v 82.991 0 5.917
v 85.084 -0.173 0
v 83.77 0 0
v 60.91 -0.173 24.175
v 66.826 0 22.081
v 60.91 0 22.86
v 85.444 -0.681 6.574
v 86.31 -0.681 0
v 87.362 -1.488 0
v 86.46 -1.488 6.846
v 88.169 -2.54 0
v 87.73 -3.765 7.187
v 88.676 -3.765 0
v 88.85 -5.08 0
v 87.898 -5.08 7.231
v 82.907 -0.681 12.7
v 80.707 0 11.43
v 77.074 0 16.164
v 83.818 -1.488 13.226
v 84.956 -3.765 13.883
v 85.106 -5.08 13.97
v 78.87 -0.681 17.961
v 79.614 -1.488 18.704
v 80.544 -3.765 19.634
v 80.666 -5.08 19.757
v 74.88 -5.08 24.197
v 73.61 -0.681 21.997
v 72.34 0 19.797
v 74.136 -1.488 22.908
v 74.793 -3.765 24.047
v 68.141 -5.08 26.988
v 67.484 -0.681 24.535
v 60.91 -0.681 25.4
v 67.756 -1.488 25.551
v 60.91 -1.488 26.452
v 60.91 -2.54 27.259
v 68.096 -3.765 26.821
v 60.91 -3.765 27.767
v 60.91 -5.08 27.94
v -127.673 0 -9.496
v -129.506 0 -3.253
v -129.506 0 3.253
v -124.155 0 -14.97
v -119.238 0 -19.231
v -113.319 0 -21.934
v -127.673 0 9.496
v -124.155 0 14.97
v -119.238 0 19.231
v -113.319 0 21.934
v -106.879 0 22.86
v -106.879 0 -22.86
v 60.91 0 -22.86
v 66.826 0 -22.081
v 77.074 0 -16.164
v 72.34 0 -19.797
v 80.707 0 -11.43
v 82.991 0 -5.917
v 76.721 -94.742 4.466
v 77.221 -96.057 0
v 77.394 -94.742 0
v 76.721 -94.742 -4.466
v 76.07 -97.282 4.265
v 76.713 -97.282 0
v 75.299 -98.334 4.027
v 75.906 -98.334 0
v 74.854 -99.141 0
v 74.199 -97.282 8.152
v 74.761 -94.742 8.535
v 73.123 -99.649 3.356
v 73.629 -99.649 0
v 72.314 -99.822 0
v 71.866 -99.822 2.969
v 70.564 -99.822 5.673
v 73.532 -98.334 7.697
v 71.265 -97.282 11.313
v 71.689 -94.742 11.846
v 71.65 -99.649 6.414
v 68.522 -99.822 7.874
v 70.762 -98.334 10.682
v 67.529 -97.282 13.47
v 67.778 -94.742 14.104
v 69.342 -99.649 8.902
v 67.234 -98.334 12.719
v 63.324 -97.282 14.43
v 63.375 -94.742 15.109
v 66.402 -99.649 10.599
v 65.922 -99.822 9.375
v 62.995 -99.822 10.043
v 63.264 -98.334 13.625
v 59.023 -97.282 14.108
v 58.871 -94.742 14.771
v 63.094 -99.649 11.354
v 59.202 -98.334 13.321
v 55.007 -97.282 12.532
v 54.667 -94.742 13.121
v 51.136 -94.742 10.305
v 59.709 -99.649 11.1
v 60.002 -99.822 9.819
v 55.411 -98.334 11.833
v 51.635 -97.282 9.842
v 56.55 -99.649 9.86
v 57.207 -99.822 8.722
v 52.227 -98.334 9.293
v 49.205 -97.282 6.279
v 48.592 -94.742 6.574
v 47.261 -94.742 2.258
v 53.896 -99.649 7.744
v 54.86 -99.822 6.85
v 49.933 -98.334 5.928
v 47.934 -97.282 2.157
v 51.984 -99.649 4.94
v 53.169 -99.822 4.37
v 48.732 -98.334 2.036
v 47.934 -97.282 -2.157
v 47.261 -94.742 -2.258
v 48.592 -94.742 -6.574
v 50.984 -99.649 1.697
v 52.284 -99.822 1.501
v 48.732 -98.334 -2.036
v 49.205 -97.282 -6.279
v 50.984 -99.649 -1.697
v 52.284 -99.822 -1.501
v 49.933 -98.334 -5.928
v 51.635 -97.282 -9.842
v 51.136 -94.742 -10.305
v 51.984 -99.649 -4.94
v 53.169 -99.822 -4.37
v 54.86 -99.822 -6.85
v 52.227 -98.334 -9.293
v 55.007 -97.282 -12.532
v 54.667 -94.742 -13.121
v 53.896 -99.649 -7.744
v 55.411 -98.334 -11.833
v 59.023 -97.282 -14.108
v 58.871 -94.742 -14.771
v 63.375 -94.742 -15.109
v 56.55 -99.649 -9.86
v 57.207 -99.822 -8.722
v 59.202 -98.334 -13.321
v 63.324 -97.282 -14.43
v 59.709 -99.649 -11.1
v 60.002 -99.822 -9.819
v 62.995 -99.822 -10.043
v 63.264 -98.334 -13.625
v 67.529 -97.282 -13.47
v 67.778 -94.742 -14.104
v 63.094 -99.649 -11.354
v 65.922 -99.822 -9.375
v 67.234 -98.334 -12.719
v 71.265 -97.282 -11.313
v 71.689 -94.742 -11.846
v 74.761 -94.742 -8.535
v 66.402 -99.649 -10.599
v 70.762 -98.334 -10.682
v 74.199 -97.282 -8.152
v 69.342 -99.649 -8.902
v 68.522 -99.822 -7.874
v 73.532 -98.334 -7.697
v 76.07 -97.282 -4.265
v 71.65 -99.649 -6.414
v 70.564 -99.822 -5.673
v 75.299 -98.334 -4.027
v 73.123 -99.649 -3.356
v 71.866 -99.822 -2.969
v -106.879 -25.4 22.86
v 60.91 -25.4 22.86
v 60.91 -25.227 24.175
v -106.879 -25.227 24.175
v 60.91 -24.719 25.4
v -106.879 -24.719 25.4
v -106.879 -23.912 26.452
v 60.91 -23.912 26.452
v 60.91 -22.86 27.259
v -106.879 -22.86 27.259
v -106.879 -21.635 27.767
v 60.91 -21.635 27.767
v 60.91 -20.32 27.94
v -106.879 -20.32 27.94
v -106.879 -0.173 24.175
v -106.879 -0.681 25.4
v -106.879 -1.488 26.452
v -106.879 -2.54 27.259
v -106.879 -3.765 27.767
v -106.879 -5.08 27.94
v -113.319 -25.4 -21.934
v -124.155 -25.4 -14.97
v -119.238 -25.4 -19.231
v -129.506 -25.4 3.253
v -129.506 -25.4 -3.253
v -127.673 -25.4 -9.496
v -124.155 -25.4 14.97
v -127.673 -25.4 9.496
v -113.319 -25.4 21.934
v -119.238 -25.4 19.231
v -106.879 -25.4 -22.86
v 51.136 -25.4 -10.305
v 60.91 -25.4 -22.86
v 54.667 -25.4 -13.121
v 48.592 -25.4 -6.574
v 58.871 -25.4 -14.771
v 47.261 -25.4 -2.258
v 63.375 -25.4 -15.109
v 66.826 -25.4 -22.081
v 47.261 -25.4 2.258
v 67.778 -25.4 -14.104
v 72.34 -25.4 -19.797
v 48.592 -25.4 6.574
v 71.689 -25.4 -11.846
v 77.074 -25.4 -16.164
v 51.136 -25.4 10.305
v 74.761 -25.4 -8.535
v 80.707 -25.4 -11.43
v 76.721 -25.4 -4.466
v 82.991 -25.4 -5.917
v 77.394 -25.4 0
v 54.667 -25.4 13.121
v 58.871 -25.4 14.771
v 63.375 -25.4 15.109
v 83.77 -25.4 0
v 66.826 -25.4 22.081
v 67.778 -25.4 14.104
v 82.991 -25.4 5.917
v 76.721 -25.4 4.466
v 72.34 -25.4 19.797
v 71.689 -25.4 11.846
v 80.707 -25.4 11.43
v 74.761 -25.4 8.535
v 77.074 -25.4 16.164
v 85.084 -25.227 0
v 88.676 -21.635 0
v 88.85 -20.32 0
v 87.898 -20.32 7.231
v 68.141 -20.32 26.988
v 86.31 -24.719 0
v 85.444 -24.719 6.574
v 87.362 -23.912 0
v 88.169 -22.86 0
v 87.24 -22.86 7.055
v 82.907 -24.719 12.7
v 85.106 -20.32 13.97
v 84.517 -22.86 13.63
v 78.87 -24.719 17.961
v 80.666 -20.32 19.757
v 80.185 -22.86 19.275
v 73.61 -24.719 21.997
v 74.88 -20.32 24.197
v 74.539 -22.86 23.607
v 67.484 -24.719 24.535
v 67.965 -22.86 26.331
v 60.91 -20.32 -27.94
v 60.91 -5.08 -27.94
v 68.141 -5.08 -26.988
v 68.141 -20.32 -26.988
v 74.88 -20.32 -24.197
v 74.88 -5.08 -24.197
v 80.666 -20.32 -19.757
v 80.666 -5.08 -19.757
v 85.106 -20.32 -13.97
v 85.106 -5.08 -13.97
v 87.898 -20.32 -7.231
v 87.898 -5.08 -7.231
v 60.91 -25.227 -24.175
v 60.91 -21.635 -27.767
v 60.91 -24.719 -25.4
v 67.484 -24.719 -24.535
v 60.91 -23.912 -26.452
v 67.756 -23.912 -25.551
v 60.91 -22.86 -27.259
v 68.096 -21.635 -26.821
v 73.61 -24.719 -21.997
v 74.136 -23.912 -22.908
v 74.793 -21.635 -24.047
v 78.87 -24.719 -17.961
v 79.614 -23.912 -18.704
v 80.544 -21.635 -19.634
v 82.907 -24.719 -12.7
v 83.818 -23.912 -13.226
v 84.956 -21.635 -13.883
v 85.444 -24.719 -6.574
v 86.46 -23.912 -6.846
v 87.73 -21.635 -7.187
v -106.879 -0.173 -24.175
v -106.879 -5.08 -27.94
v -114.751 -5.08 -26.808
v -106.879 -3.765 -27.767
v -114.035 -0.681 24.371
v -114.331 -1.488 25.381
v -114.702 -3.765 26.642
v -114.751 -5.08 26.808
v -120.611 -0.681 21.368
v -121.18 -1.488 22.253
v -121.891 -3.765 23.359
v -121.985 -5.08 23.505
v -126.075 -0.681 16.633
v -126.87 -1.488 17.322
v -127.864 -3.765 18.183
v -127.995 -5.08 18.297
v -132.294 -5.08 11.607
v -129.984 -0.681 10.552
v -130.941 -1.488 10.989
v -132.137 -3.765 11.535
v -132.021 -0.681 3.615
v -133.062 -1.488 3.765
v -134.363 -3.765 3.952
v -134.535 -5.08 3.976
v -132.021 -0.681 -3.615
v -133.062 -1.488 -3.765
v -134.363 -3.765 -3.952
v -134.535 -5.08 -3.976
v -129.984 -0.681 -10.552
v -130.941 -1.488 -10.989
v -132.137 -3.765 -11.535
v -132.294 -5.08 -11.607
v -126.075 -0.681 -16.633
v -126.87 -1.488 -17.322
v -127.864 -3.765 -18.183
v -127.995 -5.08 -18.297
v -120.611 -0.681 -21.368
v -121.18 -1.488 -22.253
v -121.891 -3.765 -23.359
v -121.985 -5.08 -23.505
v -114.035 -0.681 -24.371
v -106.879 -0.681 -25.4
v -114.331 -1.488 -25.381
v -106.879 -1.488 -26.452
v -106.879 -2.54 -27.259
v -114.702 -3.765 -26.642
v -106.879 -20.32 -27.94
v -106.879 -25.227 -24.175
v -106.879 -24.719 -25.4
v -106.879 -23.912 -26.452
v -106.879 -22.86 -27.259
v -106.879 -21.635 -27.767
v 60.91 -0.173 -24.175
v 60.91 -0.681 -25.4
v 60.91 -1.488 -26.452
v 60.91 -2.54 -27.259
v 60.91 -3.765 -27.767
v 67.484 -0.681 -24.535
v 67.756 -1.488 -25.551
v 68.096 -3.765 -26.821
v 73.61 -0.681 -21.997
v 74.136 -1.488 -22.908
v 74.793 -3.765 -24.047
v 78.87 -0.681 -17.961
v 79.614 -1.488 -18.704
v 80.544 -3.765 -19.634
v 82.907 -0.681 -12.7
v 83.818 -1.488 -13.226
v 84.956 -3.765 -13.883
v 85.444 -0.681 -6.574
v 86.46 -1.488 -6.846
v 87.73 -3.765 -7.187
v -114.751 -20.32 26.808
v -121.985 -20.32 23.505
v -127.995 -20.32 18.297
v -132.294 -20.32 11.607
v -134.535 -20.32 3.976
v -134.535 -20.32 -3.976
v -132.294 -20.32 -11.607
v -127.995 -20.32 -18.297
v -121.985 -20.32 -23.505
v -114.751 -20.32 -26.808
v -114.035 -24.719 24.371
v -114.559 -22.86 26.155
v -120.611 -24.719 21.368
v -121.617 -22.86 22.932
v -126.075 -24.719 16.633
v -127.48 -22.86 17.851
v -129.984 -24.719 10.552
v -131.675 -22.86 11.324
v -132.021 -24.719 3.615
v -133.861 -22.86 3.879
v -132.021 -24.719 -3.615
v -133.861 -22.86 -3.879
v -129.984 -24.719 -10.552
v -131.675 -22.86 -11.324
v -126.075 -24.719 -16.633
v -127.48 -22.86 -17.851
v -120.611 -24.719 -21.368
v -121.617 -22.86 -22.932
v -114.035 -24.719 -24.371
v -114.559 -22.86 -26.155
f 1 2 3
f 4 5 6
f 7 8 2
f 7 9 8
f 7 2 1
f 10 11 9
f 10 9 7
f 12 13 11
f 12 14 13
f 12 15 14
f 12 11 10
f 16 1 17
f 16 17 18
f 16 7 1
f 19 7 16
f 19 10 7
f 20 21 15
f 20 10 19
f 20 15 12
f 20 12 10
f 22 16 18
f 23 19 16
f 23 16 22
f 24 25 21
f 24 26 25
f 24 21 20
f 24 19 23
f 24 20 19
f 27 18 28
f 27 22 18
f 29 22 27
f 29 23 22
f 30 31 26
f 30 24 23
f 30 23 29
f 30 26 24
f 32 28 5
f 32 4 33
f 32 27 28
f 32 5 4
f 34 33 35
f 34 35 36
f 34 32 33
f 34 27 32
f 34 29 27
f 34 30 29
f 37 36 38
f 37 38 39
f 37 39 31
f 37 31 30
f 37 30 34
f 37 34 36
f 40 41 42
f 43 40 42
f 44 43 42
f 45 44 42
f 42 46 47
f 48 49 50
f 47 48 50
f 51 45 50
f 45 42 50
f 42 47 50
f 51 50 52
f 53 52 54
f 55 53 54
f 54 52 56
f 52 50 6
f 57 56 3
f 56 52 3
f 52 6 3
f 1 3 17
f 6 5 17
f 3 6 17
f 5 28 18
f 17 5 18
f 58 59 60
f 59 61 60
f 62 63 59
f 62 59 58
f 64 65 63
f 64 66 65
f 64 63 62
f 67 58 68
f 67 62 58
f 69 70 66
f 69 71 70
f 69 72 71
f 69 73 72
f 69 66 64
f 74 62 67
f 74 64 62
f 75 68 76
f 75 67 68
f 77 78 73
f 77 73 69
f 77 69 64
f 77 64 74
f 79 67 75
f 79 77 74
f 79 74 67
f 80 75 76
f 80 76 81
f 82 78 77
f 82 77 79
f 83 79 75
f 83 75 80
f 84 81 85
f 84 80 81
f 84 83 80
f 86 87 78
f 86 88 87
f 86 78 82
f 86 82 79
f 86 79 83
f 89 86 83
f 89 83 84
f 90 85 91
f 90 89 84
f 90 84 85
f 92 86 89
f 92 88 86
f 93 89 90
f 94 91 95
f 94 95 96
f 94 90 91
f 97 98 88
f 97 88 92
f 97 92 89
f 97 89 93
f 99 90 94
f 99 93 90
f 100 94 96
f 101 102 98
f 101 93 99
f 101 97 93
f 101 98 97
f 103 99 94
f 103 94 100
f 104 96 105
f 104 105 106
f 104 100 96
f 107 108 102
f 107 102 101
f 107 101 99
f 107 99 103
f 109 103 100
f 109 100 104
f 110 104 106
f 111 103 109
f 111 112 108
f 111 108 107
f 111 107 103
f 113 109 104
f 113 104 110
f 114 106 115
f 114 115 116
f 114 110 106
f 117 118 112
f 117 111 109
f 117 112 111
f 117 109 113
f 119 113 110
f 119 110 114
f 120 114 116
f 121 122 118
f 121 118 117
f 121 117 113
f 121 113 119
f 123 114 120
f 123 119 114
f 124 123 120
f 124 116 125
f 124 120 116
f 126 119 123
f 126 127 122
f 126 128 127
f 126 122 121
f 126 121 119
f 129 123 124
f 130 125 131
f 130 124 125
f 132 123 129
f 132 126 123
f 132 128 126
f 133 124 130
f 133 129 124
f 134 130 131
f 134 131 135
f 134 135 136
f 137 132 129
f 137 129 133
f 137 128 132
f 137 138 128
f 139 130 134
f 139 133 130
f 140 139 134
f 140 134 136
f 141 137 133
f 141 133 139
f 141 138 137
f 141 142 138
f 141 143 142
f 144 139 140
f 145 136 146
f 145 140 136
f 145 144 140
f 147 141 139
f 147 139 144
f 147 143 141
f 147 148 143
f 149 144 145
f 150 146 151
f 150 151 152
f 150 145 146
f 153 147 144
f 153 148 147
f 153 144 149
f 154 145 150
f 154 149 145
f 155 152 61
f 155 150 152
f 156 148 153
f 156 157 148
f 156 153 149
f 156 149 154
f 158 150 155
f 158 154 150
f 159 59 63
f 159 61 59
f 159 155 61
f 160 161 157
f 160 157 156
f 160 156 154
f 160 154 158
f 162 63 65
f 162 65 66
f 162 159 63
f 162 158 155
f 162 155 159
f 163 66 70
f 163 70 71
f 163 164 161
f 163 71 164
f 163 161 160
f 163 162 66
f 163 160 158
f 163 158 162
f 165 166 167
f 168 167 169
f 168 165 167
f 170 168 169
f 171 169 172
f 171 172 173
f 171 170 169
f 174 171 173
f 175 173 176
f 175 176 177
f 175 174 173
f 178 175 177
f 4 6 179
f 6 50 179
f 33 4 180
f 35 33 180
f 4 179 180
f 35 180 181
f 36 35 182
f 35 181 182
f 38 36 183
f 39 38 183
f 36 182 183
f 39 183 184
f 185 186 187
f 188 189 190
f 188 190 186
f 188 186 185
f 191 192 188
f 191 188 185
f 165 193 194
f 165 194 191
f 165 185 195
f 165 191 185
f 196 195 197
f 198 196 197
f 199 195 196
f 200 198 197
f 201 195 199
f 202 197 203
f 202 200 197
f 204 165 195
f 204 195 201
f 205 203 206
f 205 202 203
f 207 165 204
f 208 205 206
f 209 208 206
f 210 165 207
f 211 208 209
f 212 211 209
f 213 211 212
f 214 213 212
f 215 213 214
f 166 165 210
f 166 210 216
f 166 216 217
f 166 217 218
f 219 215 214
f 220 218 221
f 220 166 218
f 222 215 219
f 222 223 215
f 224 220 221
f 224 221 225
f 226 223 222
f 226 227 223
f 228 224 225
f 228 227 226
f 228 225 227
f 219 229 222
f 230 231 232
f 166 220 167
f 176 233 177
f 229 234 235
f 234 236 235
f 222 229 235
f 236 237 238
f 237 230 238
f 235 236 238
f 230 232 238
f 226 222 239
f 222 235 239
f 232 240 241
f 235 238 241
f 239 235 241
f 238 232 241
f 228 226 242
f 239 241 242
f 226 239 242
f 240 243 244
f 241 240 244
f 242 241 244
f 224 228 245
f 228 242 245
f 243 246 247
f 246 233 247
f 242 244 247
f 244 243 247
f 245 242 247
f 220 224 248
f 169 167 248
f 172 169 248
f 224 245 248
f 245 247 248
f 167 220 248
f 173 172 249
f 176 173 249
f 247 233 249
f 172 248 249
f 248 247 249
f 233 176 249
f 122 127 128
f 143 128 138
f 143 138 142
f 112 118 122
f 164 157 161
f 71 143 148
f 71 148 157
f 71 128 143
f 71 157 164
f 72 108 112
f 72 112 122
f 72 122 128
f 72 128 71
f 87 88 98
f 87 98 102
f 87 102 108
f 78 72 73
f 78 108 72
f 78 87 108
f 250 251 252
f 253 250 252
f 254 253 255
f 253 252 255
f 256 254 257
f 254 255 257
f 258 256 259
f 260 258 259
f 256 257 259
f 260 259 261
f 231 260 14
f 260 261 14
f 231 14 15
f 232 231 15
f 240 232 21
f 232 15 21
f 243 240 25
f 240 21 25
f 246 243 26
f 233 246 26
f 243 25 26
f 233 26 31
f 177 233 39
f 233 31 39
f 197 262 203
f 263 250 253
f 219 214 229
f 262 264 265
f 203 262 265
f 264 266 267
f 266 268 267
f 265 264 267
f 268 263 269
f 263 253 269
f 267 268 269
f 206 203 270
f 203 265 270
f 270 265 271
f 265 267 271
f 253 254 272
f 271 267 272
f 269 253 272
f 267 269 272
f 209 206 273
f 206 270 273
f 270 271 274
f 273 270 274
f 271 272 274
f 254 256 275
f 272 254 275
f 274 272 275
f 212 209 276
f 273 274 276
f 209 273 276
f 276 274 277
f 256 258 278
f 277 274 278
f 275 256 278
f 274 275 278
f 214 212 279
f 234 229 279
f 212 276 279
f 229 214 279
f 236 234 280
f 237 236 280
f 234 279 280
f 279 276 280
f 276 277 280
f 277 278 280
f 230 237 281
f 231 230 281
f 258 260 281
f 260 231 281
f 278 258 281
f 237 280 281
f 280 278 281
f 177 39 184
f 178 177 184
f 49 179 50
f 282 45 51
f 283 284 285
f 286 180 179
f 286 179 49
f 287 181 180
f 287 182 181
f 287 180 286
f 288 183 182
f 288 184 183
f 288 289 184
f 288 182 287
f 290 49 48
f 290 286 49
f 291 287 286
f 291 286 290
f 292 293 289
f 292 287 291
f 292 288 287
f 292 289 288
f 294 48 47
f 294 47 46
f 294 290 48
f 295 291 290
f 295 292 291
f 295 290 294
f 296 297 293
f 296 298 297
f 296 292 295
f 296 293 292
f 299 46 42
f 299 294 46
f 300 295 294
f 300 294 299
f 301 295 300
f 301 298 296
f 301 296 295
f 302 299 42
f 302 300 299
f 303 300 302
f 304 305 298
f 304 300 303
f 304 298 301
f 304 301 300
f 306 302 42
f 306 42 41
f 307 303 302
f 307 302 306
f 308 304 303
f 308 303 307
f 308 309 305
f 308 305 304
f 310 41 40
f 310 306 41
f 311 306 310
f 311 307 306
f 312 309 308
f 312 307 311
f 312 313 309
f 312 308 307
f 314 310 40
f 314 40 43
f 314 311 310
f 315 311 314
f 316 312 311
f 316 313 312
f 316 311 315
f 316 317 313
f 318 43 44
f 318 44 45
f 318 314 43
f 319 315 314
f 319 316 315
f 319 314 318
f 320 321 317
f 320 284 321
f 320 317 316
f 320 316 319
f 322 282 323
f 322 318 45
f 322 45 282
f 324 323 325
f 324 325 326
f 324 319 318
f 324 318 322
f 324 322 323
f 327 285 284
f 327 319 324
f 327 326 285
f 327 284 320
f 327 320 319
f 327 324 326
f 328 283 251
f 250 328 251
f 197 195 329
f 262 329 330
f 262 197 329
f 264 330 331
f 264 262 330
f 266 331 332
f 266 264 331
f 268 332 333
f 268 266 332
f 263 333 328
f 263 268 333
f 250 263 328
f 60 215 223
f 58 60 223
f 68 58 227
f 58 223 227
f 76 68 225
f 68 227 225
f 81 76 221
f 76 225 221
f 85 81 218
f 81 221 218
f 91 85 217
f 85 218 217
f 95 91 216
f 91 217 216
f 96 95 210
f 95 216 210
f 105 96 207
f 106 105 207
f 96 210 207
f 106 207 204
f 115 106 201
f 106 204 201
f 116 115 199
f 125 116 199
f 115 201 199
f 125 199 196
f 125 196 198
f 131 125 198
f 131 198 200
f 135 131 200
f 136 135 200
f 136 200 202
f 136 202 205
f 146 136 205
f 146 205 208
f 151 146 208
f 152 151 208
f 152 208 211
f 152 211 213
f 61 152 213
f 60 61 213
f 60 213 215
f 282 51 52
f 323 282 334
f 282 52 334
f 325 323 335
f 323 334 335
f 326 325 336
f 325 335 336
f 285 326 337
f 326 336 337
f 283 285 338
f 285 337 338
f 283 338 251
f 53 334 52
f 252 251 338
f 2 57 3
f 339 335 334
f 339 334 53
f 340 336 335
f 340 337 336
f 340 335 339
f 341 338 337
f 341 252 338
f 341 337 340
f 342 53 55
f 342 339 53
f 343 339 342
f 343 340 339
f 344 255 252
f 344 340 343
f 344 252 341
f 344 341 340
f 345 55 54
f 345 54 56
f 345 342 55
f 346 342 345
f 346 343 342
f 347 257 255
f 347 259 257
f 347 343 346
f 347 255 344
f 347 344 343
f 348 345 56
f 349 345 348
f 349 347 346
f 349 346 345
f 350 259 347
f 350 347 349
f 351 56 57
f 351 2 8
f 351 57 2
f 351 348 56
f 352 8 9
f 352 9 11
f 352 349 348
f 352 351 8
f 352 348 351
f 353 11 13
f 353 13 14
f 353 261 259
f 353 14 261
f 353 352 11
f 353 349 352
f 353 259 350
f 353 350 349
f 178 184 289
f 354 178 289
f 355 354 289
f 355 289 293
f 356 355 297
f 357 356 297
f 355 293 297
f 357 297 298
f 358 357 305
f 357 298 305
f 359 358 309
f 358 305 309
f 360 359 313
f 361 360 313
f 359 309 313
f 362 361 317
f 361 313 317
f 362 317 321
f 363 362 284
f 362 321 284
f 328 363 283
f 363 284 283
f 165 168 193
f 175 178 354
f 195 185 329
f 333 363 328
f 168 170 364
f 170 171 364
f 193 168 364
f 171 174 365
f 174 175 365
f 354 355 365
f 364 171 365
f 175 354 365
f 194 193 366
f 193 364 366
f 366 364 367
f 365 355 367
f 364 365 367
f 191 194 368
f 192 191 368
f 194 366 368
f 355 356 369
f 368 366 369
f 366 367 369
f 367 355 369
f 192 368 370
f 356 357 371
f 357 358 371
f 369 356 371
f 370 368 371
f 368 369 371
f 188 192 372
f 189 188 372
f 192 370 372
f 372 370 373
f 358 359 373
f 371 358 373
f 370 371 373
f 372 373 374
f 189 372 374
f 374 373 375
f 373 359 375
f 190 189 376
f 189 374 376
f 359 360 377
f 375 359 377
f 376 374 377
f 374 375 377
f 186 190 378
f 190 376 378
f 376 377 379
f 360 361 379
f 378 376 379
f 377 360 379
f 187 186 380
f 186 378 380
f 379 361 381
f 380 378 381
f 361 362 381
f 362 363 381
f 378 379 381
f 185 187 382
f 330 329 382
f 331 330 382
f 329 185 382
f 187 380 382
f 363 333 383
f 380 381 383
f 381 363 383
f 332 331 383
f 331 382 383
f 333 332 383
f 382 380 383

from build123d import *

# Parameters (mm, degrees)
F1_DEPTH = 25.4
F2_R     = 15.1511
F3_DEPTH = 71.374
F4_DEPTH = 28.448
F5_R     = 5.08


with BuildPart() as f1:
    # F0 (on Front) → F1 (new body)
    with BuildSketch(Plane.XZ):
        with BuildLine():
            ThreePointArc((-106.8790640436, -27.94), (-87.1225005772, -19.7565634664), (-78.9390640436, 0))
            ThreePointArc((-78.9390640436, 0), (-87.1225005772, 19.7565634664), (-106.8790640436, 27.94))
            ThreePointArc((-106.8790640436, 27.94), (-134.8190640436, 0), (-106.8790640436, -27.94))
        make_face()
        with BuildLine():
            ThreePointArc((-106.8790640436, 27.94), (-87.1225005772, 19.7565634664), (-78.9390640436, 0))
            ThreePointArc((-78.9390640436, 0), (-87.1225005772, -19.7565634664), (-106.8790640436, -27.94))
            Line((-106.8790640436, -27.94), (60.9095794208, -27.94))
            ThreePointArc((60.9095794208, -27.94), (32.9695794208, 0), (60.9095794208, 27.94))
            Line((60.9095794208, 27.94), (-106.8790640436, 27.94))
        make_face()
        with BuildLine():
            ThreePointArc((88.8495794208, 0), (80.6661428872, 19.7565634664), (60.9095794208, 27.94))
            ThreePointArc((60.9095794208, 27.94), (32.9695794208, 0), (60.9095794208, -27.94))
            ThreePointArc((60.9095794208, -27.94), (80.6661428872, -19.7565634664), (88.8495794208, 0))
        make_face()
    extrude(amount=F1_DEPTH)

    # F2 (on Front) → F3 (join)
    with BuildSketch(Plane.XZ):
        with Locations((62.2427165988, 0)):
            Circle(F2_R)
    extrude(amount=F3_DEPTH)

    # F4 (add): a face of the model
    f4_faces = [f1.faces().sort_by_distance(p)[0] for p in [
        (62.2427165988, -71.374, 0),
    ]]
    extrude(f4_faces, amount=F4_DEPTH)

    # F5
    f5_edges = [f1.edges().sort_by_distance(p)[0] for p in [
        (-22.984742, 0, 27.94),
        (-134.819064, -25.4, 0),
        (47.091617, -99.822, 0),
    ]]
    fillet(f5_edges, radius=F5_R)


solid = f1.part
